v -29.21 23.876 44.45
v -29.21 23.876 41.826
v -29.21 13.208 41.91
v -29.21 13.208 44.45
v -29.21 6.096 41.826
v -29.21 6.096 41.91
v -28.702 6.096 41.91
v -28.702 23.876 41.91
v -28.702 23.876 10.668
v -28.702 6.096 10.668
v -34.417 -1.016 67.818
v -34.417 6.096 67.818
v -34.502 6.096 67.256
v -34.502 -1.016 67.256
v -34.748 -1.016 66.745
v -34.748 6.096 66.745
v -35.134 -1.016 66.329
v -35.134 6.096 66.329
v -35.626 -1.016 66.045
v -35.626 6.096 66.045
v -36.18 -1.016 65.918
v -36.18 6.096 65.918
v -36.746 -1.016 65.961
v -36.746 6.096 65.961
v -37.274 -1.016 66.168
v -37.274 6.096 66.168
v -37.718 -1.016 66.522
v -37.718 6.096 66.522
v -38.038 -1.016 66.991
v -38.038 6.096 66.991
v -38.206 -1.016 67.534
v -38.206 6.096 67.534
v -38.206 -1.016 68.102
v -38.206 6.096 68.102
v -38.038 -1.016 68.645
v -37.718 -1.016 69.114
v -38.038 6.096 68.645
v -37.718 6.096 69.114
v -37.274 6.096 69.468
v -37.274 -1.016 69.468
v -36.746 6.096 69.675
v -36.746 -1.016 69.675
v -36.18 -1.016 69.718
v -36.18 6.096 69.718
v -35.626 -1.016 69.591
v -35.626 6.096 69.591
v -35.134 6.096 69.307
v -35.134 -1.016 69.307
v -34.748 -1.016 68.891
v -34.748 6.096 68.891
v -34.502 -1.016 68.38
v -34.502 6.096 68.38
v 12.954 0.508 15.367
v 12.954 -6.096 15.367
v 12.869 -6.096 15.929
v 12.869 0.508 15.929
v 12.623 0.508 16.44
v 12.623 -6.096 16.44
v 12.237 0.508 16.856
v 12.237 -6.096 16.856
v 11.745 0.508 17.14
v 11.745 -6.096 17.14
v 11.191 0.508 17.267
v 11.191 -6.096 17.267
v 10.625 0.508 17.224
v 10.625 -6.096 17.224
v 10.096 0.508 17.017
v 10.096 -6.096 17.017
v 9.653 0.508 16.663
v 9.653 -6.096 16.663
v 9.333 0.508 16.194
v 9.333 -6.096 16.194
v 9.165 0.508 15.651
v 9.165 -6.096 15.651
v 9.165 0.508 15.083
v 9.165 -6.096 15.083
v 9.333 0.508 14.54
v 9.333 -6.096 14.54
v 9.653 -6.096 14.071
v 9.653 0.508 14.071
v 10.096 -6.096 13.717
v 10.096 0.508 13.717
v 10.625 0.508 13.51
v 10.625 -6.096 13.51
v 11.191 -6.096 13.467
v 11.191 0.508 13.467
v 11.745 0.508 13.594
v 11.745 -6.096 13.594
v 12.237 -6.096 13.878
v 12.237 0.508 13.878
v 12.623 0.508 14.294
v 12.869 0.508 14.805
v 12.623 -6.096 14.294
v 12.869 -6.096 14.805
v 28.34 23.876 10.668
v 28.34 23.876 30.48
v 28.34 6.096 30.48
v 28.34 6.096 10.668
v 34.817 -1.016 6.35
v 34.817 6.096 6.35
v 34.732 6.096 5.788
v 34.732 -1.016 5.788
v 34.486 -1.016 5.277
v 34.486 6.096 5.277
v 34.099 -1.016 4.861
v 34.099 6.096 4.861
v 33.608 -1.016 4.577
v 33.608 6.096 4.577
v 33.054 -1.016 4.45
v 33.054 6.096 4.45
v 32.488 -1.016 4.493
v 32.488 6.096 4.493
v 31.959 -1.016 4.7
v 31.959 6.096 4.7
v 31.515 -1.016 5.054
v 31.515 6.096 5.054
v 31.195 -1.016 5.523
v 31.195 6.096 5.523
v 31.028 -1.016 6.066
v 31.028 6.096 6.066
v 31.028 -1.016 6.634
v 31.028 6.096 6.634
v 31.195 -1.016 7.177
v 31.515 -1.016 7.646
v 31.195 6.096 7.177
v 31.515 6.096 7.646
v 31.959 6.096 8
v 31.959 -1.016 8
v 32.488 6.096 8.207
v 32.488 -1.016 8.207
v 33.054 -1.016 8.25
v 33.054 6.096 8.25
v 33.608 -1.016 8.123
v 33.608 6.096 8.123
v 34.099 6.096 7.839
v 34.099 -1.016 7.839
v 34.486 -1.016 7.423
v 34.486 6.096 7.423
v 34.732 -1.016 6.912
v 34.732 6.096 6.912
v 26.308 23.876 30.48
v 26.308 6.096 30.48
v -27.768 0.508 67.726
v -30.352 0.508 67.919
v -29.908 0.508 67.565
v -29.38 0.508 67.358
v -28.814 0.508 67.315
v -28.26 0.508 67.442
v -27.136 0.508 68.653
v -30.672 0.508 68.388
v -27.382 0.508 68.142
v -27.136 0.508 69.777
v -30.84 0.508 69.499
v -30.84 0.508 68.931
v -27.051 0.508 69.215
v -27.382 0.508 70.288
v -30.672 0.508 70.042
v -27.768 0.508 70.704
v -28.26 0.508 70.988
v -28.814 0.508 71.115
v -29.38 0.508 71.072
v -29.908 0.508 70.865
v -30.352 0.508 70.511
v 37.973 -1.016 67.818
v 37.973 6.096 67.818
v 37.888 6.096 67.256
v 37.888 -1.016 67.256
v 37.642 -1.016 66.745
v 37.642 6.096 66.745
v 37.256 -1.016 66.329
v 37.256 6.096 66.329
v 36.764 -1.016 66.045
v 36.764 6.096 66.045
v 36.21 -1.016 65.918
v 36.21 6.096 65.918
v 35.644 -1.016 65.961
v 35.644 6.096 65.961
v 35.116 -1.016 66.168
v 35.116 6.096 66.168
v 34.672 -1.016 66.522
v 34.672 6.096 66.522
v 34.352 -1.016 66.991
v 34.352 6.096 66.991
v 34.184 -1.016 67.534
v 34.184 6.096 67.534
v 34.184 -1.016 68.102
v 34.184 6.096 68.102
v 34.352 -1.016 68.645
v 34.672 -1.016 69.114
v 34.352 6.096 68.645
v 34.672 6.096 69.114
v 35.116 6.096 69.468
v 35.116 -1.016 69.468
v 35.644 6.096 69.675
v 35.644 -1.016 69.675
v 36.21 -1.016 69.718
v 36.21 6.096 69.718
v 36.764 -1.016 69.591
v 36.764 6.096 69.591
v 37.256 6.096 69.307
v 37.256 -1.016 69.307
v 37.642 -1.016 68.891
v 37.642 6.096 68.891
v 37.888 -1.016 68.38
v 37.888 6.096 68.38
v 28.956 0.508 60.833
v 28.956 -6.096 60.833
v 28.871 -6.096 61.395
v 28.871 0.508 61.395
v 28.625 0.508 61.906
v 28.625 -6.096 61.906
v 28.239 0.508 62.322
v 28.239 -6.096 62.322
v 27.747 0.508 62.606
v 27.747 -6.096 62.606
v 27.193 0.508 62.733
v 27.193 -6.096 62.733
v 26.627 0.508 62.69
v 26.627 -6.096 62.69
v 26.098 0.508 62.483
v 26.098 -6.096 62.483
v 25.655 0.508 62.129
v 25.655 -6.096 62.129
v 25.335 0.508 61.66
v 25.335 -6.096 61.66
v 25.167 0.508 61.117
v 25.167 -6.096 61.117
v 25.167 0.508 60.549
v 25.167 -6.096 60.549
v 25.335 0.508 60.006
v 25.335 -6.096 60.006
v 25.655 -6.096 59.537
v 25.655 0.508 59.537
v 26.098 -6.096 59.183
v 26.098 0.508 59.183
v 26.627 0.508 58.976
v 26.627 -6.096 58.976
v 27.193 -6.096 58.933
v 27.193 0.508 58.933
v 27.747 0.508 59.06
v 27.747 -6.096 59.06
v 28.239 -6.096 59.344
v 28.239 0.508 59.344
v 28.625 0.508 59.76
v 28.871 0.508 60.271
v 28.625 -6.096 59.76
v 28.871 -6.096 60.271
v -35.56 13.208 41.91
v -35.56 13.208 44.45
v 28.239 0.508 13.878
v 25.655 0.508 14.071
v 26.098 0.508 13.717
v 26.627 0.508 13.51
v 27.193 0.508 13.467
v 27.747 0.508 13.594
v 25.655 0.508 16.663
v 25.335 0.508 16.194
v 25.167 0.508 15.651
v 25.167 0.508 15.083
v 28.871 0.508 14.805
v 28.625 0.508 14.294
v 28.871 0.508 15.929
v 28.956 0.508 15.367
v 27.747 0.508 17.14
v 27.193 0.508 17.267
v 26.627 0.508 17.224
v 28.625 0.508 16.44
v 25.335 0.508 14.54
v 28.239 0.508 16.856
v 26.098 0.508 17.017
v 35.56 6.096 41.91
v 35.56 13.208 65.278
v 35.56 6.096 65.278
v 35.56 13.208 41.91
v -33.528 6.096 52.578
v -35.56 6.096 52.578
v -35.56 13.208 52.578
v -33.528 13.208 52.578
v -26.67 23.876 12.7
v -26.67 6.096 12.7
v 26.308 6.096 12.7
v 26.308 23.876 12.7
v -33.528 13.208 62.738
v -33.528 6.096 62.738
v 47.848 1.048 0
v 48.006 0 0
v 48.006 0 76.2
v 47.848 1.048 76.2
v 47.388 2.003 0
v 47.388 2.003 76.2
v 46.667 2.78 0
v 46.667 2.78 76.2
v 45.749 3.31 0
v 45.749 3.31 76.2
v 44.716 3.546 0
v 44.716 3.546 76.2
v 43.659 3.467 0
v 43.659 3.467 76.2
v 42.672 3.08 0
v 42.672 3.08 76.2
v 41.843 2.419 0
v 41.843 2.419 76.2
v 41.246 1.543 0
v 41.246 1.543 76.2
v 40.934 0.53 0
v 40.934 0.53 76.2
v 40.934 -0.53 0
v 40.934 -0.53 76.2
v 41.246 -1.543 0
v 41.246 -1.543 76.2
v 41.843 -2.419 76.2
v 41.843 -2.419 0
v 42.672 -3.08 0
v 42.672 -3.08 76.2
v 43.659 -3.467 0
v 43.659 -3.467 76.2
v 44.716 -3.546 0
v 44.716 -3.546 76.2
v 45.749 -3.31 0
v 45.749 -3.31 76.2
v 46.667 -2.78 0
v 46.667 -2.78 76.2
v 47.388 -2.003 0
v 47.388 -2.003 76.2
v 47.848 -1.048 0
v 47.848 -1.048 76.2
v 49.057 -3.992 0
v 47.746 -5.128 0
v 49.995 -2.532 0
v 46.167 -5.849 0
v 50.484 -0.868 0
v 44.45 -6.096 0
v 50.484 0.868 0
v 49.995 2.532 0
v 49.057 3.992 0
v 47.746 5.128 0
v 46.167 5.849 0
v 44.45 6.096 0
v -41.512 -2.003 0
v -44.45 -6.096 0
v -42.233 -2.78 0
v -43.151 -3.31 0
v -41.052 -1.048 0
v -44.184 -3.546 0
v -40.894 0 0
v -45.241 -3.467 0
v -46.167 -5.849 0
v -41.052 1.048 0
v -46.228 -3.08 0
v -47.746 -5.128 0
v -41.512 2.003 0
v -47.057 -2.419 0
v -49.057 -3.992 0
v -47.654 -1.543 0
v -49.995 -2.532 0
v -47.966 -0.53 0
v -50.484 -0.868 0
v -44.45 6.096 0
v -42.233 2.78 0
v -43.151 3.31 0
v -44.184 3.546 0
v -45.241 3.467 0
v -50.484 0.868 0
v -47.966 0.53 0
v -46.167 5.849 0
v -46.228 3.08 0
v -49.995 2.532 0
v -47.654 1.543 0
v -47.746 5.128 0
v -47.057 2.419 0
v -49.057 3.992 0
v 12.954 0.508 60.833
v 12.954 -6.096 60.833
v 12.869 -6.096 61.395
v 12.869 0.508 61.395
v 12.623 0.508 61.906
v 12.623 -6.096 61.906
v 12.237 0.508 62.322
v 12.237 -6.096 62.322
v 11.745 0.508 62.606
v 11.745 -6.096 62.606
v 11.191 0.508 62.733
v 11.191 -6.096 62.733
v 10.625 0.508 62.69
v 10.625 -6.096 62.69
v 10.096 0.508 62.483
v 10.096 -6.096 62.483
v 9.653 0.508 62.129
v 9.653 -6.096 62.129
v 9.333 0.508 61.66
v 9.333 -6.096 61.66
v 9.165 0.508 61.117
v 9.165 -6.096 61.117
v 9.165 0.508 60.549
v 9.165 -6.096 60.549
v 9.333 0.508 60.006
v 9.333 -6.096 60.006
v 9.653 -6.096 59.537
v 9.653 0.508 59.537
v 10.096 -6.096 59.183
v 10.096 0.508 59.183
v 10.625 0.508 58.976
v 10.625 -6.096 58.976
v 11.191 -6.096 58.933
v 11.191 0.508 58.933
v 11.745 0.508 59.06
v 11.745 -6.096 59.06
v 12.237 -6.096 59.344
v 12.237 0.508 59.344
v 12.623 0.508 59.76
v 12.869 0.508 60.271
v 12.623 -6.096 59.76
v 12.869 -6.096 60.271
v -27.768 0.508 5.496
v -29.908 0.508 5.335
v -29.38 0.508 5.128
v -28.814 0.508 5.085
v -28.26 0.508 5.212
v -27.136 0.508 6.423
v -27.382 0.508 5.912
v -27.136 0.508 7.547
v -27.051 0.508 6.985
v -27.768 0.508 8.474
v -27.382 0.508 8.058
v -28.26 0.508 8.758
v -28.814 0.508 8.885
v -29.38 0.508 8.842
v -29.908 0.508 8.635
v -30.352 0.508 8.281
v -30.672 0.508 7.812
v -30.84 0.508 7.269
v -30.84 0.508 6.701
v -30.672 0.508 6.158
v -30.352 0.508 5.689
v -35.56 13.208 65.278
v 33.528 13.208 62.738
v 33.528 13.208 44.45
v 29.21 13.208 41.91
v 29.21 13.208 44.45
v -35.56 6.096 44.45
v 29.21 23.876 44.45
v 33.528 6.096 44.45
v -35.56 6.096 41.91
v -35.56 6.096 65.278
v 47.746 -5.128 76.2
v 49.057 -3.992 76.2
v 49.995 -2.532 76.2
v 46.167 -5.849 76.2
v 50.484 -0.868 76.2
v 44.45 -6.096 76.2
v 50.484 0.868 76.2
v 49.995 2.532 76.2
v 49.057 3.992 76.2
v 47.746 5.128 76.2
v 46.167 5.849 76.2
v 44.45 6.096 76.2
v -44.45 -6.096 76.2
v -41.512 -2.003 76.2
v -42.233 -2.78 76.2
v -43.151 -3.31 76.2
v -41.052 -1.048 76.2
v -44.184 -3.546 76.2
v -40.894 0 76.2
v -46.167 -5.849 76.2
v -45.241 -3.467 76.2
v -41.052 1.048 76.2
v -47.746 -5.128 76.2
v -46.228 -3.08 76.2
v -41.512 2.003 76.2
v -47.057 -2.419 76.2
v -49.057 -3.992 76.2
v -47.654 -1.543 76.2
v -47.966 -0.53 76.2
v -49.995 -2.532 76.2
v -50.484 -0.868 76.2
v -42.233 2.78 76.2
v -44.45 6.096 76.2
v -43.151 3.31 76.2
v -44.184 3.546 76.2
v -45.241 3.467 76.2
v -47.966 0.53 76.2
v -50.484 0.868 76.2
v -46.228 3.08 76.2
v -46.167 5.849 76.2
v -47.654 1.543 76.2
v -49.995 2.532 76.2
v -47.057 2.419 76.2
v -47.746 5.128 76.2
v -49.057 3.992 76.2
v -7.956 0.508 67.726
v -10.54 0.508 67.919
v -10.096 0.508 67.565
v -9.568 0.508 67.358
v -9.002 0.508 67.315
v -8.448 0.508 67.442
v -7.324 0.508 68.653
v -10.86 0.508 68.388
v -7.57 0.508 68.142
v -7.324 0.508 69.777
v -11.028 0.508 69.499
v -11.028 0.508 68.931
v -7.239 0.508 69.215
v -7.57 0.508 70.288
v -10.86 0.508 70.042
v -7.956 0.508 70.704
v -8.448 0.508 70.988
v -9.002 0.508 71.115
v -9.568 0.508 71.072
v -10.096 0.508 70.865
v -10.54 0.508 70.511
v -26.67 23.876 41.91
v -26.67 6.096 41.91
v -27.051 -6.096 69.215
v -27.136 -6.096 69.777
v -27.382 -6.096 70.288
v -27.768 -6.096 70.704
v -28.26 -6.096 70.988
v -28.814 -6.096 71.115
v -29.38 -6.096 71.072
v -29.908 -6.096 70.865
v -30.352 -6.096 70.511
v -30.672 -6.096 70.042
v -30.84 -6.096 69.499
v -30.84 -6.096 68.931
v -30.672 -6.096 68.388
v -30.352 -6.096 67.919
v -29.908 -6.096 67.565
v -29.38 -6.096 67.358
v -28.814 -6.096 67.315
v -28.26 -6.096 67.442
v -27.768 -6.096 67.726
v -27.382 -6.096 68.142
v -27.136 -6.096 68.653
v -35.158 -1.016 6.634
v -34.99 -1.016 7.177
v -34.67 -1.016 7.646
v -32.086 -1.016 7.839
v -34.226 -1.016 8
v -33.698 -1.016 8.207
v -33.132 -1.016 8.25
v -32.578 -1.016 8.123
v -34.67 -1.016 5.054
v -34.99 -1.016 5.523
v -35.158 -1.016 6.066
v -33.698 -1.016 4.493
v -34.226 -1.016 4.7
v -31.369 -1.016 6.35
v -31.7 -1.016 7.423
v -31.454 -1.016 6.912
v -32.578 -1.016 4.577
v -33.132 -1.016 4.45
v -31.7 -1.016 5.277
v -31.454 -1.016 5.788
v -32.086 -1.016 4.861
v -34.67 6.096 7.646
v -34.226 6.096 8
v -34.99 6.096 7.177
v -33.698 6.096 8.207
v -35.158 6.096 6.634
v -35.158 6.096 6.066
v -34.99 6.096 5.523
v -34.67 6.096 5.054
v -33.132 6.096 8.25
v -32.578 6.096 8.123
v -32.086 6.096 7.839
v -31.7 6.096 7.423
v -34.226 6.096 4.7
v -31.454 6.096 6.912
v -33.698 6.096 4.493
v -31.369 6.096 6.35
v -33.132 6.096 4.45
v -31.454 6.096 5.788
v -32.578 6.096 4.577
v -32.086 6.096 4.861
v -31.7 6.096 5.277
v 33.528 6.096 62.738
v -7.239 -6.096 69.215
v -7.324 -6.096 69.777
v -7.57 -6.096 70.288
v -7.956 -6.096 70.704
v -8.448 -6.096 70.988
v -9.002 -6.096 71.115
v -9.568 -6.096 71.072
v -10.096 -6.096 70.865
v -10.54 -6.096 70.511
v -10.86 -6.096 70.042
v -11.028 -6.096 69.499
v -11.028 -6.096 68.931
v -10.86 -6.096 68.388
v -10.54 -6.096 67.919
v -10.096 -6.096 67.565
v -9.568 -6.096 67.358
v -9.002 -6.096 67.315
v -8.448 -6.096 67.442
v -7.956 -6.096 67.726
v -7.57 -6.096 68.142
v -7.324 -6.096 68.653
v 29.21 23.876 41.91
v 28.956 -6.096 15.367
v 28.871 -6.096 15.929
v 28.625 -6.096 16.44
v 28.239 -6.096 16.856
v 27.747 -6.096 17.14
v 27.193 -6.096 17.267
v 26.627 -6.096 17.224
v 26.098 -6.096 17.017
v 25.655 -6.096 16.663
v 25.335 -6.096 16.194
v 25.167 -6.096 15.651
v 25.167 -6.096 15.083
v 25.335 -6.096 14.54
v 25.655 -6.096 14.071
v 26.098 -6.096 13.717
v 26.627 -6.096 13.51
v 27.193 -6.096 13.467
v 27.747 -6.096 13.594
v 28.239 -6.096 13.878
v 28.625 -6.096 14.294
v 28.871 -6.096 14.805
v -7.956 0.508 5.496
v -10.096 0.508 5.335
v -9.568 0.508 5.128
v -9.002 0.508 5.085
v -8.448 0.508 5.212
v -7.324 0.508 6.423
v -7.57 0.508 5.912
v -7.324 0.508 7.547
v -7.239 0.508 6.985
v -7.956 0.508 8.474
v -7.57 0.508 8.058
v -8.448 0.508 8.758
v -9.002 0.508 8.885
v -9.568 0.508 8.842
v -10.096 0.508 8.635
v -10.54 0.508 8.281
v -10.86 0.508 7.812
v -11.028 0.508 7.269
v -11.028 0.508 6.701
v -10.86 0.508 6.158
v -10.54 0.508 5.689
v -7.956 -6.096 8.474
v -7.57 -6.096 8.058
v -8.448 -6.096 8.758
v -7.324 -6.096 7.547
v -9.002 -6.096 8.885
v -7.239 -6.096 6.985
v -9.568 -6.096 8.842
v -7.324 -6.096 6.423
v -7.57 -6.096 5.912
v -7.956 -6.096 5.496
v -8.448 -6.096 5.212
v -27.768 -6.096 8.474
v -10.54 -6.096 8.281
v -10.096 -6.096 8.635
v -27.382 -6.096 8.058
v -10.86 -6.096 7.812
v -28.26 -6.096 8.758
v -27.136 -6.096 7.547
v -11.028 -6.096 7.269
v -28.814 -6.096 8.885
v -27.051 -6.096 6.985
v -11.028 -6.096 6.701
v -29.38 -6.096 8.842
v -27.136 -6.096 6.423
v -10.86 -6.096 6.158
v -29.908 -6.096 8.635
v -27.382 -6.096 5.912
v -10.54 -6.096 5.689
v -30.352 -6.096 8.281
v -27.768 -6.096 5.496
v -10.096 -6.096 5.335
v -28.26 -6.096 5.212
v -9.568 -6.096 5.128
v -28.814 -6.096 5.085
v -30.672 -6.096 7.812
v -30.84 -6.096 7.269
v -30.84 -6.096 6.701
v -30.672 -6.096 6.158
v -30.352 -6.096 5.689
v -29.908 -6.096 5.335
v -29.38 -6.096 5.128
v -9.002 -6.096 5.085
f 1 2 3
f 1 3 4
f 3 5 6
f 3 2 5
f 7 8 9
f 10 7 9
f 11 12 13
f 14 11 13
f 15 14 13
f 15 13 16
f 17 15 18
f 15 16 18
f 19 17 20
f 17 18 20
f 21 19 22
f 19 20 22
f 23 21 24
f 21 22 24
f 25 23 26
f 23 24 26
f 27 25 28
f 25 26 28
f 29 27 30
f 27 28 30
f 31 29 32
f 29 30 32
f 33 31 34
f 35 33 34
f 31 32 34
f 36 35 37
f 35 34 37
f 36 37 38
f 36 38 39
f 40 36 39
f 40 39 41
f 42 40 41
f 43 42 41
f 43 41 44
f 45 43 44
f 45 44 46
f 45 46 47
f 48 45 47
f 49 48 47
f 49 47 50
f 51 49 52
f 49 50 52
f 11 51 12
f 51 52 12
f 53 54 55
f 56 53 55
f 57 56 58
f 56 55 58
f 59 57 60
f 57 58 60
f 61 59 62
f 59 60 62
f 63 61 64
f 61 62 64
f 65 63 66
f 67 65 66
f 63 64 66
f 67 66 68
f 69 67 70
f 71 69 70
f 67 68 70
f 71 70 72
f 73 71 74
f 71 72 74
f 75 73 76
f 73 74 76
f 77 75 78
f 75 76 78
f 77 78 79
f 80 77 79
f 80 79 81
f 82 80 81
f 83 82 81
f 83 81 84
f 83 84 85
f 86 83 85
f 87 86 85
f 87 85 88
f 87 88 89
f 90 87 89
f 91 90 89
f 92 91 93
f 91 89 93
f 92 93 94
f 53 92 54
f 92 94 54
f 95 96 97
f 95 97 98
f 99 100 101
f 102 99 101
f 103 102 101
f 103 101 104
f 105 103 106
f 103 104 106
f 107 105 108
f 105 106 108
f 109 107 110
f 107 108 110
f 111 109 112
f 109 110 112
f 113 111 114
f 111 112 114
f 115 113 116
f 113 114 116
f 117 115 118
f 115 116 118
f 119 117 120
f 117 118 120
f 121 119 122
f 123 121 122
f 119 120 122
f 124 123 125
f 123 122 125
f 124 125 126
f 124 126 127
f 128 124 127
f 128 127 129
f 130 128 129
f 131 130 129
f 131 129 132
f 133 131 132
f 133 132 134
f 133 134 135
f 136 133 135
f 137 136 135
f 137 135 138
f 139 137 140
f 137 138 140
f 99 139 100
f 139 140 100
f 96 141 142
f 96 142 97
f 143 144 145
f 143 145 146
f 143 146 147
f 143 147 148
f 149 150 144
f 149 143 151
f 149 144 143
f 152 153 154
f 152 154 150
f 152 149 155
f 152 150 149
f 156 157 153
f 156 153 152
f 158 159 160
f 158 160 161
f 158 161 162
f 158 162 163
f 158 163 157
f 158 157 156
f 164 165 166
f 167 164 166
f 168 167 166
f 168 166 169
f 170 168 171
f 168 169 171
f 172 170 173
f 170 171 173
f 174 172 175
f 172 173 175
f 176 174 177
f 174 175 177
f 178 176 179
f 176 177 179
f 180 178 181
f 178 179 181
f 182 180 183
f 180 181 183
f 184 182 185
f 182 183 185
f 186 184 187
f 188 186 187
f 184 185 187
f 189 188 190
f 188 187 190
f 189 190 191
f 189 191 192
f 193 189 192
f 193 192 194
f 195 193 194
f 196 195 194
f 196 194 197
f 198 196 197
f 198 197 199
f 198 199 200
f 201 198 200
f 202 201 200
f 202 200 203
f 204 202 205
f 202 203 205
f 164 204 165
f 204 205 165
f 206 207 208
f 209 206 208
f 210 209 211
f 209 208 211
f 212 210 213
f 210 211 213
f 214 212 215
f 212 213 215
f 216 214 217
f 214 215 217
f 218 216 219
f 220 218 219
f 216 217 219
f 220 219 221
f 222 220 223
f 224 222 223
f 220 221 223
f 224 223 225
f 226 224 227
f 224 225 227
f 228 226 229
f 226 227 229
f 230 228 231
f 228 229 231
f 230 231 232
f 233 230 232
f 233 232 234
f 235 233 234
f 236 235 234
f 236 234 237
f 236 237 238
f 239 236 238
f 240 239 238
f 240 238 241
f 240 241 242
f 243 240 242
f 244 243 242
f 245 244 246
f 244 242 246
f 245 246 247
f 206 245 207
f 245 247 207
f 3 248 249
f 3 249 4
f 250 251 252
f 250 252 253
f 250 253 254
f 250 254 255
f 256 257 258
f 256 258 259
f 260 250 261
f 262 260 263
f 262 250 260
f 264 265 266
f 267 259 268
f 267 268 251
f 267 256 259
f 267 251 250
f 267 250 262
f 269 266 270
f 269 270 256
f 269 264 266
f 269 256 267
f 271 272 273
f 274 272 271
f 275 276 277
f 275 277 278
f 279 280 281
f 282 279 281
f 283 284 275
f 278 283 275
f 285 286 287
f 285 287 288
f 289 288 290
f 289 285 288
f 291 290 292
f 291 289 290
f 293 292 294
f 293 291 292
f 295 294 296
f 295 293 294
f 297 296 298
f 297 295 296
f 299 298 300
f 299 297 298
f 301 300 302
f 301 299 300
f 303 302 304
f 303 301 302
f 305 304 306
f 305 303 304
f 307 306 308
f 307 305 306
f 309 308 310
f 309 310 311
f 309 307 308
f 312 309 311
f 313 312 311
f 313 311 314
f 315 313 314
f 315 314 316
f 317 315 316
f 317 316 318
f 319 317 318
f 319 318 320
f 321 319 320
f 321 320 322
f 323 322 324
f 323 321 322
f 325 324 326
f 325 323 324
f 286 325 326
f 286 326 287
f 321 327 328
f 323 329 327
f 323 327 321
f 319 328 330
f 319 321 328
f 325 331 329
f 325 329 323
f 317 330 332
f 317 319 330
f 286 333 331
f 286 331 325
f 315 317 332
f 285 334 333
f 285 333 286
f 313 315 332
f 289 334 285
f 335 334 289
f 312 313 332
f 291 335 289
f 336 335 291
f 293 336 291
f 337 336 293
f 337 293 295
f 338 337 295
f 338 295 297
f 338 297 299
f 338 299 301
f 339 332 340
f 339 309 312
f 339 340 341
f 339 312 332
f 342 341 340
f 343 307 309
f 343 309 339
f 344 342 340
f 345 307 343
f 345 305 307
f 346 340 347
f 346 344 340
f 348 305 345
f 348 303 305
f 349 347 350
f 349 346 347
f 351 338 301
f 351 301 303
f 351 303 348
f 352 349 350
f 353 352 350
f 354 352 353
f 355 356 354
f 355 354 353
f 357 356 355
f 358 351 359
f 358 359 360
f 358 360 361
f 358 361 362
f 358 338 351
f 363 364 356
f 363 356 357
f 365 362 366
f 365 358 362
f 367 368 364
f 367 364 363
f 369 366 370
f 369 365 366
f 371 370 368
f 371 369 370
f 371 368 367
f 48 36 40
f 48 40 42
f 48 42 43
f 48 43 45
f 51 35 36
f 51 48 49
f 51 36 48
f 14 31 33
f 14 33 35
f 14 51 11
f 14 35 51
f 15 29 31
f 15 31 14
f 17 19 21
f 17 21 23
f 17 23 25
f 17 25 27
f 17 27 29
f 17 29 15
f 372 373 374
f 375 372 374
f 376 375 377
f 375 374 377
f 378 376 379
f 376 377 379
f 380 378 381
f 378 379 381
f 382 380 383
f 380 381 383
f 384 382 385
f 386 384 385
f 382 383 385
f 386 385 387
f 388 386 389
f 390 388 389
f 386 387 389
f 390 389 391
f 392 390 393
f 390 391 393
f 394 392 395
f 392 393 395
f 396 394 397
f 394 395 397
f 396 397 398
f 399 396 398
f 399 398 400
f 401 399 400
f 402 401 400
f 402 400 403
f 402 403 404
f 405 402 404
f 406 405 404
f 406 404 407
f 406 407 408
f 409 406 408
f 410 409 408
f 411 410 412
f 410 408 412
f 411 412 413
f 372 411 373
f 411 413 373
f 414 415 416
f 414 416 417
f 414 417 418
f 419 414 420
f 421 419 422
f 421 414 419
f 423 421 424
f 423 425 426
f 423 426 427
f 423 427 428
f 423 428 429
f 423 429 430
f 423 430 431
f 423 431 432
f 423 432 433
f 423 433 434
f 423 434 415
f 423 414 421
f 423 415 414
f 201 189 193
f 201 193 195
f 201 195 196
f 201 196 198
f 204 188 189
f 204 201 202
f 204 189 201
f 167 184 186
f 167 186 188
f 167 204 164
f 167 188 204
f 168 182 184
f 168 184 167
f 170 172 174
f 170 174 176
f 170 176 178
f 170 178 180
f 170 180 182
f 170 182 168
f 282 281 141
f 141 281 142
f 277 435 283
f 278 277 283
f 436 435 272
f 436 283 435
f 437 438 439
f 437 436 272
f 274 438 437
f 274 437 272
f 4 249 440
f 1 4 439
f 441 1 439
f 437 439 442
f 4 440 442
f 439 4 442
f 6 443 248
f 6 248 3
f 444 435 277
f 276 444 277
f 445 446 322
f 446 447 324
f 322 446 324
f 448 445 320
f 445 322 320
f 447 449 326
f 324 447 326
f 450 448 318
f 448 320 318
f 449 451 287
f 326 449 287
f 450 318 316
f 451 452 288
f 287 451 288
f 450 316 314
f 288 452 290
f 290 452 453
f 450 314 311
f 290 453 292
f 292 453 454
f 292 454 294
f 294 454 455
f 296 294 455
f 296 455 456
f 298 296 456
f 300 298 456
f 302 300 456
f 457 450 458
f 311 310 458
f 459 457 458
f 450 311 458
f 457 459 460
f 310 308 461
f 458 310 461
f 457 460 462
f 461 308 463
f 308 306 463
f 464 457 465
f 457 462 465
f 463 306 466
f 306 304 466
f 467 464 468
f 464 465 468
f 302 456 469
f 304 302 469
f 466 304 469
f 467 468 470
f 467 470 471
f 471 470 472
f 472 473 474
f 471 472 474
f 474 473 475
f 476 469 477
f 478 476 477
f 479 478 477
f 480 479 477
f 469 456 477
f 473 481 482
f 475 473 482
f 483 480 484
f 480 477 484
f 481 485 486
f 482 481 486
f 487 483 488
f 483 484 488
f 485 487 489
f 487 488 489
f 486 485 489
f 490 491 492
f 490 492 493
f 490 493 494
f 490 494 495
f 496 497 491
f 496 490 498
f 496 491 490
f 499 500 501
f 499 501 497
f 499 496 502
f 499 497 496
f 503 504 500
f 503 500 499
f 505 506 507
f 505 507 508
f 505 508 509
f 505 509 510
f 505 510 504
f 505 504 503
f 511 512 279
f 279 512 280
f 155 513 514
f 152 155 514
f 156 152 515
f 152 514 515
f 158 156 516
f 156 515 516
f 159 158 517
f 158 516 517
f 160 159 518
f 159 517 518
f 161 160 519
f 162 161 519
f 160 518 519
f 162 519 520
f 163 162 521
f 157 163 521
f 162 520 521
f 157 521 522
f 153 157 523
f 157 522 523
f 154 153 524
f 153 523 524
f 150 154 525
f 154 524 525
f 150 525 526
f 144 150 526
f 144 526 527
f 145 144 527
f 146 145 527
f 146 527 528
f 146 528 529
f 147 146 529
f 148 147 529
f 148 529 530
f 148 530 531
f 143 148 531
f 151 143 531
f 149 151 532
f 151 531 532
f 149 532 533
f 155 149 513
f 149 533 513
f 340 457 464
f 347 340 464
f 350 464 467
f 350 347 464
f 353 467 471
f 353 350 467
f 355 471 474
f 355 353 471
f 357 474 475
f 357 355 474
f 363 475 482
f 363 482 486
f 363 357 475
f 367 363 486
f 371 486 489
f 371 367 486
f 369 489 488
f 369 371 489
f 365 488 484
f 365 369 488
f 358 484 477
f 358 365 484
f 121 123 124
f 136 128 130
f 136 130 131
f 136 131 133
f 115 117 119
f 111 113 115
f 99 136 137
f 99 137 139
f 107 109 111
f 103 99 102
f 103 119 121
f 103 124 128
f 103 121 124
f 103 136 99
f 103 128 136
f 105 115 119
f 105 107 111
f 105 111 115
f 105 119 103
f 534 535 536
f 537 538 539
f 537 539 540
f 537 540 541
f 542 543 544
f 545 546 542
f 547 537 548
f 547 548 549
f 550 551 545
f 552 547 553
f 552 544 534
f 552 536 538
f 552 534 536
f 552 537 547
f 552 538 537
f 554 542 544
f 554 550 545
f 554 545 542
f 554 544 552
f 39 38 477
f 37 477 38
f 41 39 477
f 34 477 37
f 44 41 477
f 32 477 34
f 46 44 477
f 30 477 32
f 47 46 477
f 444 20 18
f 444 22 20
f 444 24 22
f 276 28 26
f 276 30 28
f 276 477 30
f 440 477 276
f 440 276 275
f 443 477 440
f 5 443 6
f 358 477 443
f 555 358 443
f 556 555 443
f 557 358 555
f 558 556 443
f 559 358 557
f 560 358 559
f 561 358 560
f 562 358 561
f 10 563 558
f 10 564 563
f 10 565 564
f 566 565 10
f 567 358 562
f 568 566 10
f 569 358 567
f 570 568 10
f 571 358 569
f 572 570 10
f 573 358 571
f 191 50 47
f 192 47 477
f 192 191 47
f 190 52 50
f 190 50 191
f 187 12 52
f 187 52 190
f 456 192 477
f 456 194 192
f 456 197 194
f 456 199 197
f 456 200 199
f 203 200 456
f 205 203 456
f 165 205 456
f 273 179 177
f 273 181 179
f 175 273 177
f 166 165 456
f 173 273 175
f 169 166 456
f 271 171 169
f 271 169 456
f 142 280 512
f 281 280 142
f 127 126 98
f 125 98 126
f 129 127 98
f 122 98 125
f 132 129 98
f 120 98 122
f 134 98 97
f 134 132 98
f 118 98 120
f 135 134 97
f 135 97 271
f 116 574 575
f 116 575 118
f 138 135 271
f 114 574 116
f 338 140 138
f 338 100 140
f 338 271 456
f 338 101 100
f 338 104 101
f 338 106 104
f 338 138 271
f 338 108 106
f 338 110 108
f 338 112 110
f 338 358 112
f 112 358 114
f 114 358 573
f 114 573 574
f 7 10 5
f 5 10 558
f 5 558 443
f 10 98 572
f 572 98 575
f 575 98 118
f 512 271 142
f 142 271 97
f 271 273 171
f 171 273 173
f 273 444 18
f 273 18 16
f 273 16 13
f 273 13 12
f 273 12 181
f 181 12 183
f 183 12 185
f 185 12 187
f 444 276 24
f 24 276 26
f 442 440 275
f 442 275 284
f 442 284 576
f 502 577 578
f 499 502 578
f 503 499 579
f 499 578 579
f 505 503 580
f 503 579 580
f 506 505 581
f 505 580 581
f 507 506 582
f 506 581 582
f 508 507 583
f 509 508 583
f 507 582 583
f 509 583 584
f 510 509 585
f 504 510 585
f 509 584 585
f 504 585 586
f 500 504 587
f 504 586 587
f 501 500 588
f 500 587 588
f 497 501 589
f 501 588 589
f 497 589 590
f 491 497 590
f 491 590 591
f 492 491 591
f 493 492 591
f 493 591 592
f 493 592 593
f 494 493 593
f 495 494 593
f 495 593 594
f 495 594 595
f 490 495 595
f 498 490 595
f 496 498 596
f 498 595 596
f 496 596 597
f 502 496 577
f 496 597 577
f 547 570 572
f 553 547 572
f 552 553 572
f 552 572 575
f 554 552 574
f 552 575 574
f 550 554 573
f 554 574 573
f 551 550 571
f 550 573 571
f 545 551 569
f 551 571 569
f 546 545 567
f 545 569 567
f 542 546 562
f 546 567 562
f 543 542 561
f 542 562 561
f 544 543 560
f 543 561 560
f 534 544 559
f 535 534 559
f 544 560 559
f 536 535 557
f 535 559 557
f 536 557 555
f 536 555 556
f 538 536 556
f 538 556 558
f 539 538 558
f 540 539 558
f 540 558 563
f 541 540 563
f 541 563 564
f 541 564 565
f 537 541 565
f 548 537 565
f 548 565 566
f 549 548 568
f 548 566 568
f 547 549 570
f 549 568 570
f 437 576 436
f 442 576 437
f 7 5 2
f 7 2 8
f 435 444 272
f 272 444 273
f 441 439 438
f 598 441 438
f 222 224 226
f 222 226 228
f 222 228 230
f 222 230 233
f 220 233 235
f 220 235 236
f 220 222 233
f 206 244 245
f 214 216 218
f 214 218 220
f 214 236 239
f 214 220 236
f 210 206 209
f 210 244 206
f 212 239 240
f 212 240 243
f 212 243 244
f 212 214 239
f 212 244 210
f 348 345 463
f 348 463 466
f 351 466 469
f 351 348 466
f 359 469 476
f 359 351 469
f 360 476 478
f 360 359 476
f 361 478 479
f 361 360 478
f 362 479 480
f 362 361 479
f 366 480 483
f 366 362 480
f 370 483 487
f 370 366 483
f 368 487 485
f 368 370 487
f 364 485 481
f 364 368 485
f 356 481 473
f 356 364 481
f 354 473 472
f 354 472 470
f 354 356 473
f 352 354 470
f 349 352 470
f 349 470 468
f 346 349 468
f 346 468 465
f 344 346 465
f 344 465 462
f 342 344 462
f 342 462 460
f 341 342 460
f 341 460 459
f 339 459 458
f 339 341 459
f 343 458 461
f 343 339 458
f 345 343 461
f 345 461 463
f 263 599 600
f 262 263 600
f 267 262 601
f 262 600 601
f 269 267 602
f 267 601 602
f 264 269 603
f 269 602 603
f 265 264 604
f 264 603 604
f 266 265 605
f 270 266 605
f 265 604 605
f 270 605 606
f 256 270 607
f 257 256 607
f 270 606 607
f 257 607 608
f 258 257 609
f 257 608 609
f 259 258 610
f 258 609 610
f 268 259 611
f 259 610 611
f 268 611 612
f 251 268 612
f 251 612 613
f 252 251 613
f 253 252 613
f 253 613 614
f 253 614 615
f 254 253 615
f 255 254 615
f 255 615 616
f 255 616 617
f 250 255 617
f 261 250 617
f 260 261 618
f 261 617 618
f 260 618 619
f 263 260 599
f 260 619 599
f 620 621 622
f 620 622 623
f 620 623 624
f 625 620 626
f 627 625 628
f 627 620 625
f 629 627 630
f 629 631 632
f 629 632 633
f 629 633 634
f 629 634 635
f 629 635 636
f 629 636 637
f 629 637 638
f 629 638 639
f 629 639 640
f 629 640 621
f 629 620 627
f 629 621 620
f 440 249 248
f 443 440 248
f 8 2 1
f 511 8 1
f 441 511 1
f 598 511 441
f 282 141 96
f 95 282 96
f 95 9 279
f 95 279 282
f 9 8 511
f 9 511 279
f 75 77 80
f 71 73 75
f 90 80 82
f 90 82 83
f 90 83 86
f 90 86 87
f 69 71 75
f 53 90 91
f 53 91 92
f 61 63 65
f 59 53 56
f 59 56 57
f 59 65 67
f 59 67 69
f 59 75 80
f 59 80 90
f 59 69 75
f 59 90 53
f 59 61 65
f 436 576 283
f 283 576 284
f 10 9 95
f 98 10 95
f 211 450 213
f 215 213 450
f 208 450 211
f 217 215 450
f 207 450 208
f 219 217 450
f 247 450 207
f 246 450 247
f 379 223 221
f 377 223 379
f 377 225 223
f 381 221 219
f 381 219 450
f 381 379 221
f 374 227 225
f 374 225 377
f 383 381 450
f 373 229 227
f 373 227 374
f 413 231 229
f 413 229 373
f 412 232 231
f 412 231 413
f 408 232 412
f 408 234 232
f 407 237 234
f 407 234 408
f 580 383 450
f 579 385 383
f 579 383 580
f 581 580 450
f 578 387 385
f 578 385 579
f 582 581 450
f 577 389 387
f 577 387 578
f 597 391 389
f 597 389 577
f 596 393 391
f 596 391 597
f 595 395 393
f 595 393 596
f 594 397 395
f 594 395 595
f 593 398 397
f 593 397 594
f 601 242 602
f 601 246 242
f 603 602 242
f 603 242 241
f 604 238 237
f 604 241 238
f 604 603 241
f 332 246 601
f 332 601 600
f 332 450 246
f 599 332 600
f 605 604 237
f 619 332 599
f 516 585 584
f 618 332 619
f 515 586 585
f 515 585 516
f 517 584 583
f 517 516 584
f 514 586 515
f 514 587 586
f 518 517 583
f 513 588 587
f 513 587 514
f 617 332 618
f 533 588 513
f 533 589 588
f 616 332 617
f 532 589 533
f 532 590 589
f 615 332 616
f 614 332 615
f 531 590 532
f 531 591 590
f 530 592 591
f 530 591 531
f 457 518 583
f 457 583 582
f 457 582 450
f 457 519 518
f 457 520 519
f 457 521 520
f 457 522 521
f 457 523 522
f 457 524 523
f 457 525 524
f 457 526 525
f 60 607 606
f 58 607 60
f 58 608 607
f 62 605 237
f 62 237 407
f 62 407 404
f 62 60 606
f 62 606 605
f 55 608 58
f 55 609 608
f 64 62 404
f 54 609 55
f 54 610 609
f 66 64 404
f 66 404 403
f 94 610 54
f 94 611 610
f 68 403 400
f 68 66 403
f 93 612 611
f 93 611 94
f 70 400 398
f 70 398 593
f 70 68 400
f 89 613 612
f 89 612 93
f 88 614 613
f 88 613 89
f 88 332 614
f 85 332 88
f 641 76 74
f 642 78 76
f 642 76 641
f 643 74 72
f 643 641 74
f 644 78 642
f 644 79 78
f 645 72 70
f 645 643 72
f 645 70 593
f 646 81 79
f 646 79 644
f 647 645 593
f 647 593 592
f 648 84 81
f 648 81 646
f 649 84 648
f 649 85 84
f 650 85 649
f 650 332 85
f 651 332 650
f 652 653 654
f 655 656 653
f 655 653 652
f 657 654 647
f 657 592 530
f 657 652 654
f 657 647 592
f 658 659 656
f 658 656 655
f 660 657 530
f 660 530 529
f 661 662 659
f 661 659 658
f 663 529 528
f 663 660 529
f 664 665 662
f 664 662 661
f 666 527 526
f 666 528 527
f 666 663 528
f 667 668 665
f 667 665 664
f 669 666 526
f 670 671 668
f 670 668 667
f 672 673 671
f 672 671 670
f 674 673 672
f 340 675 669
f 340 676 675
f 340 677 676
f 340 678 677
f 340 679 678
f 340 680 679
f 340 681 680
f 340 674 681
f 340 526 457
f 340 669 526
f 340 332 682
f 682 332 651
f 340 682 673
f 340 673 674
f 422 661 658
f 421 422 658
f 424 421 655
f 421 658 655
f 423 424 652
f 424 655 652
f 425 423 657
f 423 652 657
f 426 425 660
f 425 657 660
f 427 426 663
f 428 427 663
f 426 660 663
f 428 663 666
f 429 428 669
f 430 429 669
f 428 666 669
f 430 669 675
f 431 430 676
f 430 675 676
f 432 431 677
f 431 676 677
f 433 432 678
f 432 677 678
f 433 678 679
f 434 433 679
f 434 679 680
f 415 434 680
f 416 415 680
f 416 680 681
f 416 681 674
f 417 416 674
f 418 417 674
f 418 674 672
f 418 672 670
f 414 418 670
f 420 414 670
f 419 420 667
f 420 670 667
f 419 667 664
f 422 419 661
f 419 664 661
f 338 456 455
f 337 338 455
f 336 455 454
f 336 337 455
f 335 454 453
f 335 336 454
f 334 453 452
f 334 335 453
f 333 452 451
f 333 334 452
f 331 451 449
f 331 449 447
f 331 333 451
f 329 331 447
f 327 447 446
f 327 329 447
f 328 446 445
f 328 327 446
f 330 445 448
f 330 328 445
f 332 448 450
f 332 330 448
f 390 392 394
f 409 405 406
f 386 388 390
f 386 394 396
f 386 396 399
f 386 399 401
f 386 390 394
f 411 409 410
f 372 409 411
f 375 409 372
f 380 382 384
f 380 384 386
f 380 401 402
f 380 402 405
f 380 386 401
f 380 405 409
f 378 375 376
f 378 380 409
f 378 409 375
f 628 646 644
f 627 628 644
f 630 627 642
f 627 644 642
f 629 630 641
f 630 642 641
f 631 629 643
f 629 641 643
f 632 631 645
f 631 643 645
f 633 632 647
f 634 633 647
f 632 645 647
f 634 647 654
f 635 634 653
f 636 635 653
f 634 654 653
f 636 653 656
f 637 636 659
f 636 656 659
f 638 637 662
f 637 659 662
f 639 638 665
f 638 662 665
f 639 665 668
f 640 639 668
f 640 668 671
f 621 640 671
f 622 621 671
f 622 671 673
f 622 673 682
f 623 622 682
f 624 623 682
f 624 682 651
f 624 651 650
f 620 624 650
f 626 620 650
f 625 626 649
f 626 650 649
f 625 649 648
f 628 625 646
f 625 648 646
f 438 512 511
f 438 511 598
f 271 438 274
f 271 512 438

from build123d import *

# Parameters (mm, degrees)
SKETCH1_R           = 3.556
BOSS_EXTRUDE1_DEPTH = 76.2
SKETCH2_R           = 1.905
CUT_EXTRUDE1_DEPTH  = 6.604
BOSS_EXTRUDE2_DEPTH = 17.78
SKETCH4_W           = 6.858
SKETCH4_H           = 2.54
SKETCH4_W_2         = 2.54
SKETCH4_H_2         = 10.16
SKETCH4_H_3         = 18.288
BOSS_EXTRUDE3_DEPTH = 7.112
SKETCH5_R           = 1.905
CUT_EXTRUDE3_DEPTH  = 7.112
SKETCH6_R           = 1.905
CUT_EXTRUDE4_DEPTH  = 7.112
SKETCH8_W           = 0.508
SKETCH8_H           = 20.32
CUT_EXTRUDE5_DEPTH  = 17.78
SKETCH9_W           = 0.508
SKETCH9_H           = 2.54
CUT_EXTRUDE6_DEPTH  = 7.112
SKETCH10_W          = 0.508
SKETCH10_H          = 12.7
SKETCH10_H_2        = 23.368
CUT_EXTRUDE7_DEPTH  = 7.112
SKETCH11_W          = 57.041716114
SKETCH11_H          = 0.508
CUT_EXTRUDE8_DEPTH  = 17.78


with BuildPart() as part:
    # Sketch1 → Boss-Extrude1 (new body)
    with BuildSketch(Plane.XY):
        with BuildLine():
            Line((-44.45, 6.096), (44.45, 6.096))
            ThreePointArc((44.45, 6.096), (50.546, 0), (44.45, -6.096))
            Line((44.45, -6.096), (-44.45, -6.096))
            ThreePointArc((-44.45, -6.096), (-50.546, 0), (-44.45, 6.096))
        make_face()
        with Locations((-44.45, 0)):
            Circle(SKETCH1_R, mode=Mode.SUBTRACT)
        with Locations((44.45, 0)):
            Circle(SKETCH1_R, mode=Mode.SUBTRACT)
    extrude(amount=BOSS_EXTRUDE1_DEPTH)

    # Sketch2 → Cut-Extrude1 (cut)
    with BuildSketch(Plane.XZ.offset(6.096)):
        with Locations((-9.144, 69.215)):
            Circle(SKETCH2_R)
        with Locations((27.051, 60.833)):
            Circle(SKETCH2_R)
        with Locations((-28.956, 69.215)):
            Circle(SKETCH2_R)
        with Locations((-28.956, 6.985)):
            Circle(SKETCH2_R)
        with Locations((-9.144, 6.985)):
            Circle(SKETCH2_R)
        with Locations((11.049, 60.833)):
            Circle(SKETCH2_R)
        with Locations((11.049, 15.367)):
            Circle(SKETCH2_R)
        with Locations((27.051, 15.367)):
            Circle(SKETCH2_R)
    extrude(amount=-CUT_EXTRUDE1_DEPTH, mode=Mode.SUBTRACT)

    # Sketch3 → Boss-Extrude2 (add)
    with BuildSketch(Plane(origin=(0, 6.096, 0), x_dir=(1, 0, 0), z_dir=(0, 1, 0))):
        Polygon((-29.21, -10.16), (-29.21, -44.45), (29.21, -44.45), (29.21, -41.91), (-26.67, -41.91), (-26.67, -12.7), (26.307716114, -12.7), (26.307716114, -30.48), (28.847716114, -30.48), (28.847716114, -10.16), align=None)
    extrude(amount=BOSS_EXTRUDE2_DEPTH)

    # Sketch4 → Boss-Extrude3 (add)
    with BuildSketch(Plane(origin=(0, 6.096, 0), x_dir=(1, 0, 0), z_dir=(0, 1, 0))):
        with Locations((-32.639, -43.18)):
            Rectangle(SKETCH4_W, SKETCH4_H)
        with Locations((-34.798, -57.658)):
            Rectangle(SKETCH4_W_2, SKETCH4_H_2)
        Polygon((36.068, -62.738), (33.528, -62.738), (-33.528, -62.738), (-36.068, -62.738), (-36.068, -65.278), (36.068, -65.278), align=None)
        with Locations((34.798, -53.594)):
            Rectangle(SKETCH4_W_2, SKETCH4_H_3)
        with Locations((32.639, -43.18)):
            Rectangle(SKETCH4_W, SKETCH4_H)
    extrude(amount=BOSS_EXTRUDE3_DEPTH)

    # Sketch5 → Cut-Extrude3 (cut)
    with BuildSketch(Plane(origin=(0, 6.096, 0), x_dir=(1, 0, 0), z_dir=(0, 1, 0))):
        with Locations((36.068, -67.818)):
            Circle(SKETCH5_R)
        with Locations((32.911716114, -6.35)):
            Circle(SKETCH5_R)
    extrude(amount=-CUT_EXTRUDE3_DEPTH, mode=Mode.SUBTRACT)

    # Sketch6 → Cut-Extrude4 (cut)
    with BuildSketch(Plane(origin=(0, 6.096, 0), x_dir=(1, 0, 0), z_dir=(0, 1, 0))):
        with Locations((-33.274, -6.35)):
            Circle(SKETCH6_R)
        with Locations((-36.322, -67.818)):
            Circle(SKETCH6_R)
    extrude(amount=-CUT_EXTRUDE4_DEPTH, mode=Mode.SUBTRACT)

    # Sketch8 → Cut-Extrude5 (cut)
    with BuildSketch(Plane(origin=(0, 23.876, 0), x_dir=(1, 0, 0), z_dir=(0, 1, 0))):
        with Locations((28.593716114, -20.32)):
            Rectangle(SKETCH8_W, SKETCH8_H)
        Polygon((-28.702, -41.91), (-28.702, -10.16), (-29.21, -10.16), (-29.21, -41.825929555), align=None)
    extrude(amount=-CUT_EXTRUDE5_DEPTH, mode=Mode.SUBTRACT)

    # Sketch9 → Cut-Extrude6 (cut)
    with BuildSketch(Plane(origin=(0, 13.208, 0), x_dir=(1, 0, 0), z_dir=(0, 1, 0))):
        with Locations((-35.814, -43.18)):
            Rectangle(SKETCH9_W, SKETCH9_H)
    extrude(amount=-CUT_EXTRUDE6_DEPTH, mode=Mode.SUBTRACT)

    # Sketch10 → Cut-Extrude7 (cut)
    with BuildSketch(Plane(origin=(0, 13.208, 0), x_dir=(1, 0, 0), z_dir=(0, 1, 0))):
        with Locations((-35.814, -58.928)):
            Rectangle(SKETCH10_W, SKETCH10_H)
        with Locations((35.814, -53.594)):
            Rectangle(SKETCH10_W, SKETCH10_H_2)
    extrude(amount=-CUT_EXTRUDE7_DEPTH, mode=Mode.SUBTRACT)

    # Sketch11 → Cut-Extrude8 (cut)
    with BuildSketch(Plane(origin=(0, 23.876, 0), x_dir=(1, 0, 0), z_dir=(0, 1, 0))):
        with Locations((-0.181141943, -10.414)):
            Rectangle(SKETCH11_W, SKETCH11_H)
    extrude(amount=-CUT_EXTRUDE8_DEPTH, mode=Mode.SUBTRACT)


solid = part.part
